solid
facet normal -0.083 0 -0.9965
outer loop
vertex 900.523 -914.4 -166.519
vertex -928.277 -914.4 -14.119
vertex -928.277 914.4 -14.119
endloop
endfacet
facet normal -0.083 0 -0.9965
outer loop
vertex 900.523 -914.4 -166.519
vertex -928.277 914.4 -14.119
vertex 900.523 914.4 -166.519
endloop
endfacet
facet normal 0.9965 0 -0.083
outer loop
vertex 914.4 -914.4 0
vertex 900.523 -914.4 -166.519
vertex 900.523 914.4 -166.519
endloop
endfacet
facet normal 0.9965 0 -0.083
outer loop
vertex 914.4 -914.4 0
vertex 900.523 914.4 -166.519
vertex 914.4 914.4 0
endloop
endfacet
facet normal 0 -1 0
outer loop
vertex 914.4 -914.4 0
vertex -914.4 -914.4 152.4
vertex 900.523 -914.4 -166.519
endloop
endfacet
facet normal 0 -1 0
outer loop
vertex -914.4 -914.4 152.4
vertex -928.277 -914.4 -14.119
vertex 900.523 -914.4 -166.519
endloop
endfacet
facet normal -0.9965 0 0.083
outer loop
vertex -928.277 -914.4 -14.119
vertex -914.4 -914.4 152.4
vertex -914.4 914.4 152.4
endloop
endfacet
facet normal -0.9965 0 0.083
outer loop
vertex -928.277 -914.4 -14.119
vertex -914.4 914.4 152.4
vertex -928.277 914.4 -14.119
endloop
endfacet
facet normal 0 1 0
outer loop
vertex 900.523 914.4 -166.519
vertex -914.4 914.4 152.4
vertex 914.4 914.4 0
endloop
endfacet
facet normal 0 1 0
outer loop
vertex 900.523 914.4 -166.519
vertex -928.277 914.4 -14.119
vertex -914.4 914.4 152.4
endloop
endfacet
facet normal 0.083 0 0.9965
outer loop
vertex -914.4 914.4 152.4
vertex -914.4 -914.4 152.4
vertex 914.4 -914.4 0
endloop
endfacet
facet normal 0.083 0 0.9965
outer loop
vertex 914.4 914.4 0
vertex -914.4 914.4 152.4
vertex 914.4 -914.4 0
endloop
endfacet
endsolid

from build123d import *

# Parameters (mm, degrees)
F0_W     = 1828.8
F0_H     = 1828.8
F1_DEPTH = 152.4
F3_DEPTH = 1828.801
F4_DEPTH = 1828.8


with BuildPart() as f1:
    # F0 (on Top) → F1 (new body)
    with BuildSketch(Plane.XY):
        Rectangle(F0_W, F0_H)
    extrude(amount=F1_DEPTH)

    # F2 (on face) → F3 (cut, through all)
    with BuildSketch(Plane.XZ.offset(914.4)):
        Polygon((914.4, 152.4), (-914.4, 152.4), (914.4, 0), align=None)
    extrude(amount=-F3_DEPTH, mode=Mode.SUBTRACT)

    # F2 (on face) → F4 (join, through all)
    with BuildSketch(Plane.XZ.offset(914.4)):
        Polygon((914.4, 0), (-914.4, 152.4), (-928.276584, -14.119007), (900.523416, -166.519007), align=None)
    extrude(amount=-F4_DEPTH)


solid = f1.part
